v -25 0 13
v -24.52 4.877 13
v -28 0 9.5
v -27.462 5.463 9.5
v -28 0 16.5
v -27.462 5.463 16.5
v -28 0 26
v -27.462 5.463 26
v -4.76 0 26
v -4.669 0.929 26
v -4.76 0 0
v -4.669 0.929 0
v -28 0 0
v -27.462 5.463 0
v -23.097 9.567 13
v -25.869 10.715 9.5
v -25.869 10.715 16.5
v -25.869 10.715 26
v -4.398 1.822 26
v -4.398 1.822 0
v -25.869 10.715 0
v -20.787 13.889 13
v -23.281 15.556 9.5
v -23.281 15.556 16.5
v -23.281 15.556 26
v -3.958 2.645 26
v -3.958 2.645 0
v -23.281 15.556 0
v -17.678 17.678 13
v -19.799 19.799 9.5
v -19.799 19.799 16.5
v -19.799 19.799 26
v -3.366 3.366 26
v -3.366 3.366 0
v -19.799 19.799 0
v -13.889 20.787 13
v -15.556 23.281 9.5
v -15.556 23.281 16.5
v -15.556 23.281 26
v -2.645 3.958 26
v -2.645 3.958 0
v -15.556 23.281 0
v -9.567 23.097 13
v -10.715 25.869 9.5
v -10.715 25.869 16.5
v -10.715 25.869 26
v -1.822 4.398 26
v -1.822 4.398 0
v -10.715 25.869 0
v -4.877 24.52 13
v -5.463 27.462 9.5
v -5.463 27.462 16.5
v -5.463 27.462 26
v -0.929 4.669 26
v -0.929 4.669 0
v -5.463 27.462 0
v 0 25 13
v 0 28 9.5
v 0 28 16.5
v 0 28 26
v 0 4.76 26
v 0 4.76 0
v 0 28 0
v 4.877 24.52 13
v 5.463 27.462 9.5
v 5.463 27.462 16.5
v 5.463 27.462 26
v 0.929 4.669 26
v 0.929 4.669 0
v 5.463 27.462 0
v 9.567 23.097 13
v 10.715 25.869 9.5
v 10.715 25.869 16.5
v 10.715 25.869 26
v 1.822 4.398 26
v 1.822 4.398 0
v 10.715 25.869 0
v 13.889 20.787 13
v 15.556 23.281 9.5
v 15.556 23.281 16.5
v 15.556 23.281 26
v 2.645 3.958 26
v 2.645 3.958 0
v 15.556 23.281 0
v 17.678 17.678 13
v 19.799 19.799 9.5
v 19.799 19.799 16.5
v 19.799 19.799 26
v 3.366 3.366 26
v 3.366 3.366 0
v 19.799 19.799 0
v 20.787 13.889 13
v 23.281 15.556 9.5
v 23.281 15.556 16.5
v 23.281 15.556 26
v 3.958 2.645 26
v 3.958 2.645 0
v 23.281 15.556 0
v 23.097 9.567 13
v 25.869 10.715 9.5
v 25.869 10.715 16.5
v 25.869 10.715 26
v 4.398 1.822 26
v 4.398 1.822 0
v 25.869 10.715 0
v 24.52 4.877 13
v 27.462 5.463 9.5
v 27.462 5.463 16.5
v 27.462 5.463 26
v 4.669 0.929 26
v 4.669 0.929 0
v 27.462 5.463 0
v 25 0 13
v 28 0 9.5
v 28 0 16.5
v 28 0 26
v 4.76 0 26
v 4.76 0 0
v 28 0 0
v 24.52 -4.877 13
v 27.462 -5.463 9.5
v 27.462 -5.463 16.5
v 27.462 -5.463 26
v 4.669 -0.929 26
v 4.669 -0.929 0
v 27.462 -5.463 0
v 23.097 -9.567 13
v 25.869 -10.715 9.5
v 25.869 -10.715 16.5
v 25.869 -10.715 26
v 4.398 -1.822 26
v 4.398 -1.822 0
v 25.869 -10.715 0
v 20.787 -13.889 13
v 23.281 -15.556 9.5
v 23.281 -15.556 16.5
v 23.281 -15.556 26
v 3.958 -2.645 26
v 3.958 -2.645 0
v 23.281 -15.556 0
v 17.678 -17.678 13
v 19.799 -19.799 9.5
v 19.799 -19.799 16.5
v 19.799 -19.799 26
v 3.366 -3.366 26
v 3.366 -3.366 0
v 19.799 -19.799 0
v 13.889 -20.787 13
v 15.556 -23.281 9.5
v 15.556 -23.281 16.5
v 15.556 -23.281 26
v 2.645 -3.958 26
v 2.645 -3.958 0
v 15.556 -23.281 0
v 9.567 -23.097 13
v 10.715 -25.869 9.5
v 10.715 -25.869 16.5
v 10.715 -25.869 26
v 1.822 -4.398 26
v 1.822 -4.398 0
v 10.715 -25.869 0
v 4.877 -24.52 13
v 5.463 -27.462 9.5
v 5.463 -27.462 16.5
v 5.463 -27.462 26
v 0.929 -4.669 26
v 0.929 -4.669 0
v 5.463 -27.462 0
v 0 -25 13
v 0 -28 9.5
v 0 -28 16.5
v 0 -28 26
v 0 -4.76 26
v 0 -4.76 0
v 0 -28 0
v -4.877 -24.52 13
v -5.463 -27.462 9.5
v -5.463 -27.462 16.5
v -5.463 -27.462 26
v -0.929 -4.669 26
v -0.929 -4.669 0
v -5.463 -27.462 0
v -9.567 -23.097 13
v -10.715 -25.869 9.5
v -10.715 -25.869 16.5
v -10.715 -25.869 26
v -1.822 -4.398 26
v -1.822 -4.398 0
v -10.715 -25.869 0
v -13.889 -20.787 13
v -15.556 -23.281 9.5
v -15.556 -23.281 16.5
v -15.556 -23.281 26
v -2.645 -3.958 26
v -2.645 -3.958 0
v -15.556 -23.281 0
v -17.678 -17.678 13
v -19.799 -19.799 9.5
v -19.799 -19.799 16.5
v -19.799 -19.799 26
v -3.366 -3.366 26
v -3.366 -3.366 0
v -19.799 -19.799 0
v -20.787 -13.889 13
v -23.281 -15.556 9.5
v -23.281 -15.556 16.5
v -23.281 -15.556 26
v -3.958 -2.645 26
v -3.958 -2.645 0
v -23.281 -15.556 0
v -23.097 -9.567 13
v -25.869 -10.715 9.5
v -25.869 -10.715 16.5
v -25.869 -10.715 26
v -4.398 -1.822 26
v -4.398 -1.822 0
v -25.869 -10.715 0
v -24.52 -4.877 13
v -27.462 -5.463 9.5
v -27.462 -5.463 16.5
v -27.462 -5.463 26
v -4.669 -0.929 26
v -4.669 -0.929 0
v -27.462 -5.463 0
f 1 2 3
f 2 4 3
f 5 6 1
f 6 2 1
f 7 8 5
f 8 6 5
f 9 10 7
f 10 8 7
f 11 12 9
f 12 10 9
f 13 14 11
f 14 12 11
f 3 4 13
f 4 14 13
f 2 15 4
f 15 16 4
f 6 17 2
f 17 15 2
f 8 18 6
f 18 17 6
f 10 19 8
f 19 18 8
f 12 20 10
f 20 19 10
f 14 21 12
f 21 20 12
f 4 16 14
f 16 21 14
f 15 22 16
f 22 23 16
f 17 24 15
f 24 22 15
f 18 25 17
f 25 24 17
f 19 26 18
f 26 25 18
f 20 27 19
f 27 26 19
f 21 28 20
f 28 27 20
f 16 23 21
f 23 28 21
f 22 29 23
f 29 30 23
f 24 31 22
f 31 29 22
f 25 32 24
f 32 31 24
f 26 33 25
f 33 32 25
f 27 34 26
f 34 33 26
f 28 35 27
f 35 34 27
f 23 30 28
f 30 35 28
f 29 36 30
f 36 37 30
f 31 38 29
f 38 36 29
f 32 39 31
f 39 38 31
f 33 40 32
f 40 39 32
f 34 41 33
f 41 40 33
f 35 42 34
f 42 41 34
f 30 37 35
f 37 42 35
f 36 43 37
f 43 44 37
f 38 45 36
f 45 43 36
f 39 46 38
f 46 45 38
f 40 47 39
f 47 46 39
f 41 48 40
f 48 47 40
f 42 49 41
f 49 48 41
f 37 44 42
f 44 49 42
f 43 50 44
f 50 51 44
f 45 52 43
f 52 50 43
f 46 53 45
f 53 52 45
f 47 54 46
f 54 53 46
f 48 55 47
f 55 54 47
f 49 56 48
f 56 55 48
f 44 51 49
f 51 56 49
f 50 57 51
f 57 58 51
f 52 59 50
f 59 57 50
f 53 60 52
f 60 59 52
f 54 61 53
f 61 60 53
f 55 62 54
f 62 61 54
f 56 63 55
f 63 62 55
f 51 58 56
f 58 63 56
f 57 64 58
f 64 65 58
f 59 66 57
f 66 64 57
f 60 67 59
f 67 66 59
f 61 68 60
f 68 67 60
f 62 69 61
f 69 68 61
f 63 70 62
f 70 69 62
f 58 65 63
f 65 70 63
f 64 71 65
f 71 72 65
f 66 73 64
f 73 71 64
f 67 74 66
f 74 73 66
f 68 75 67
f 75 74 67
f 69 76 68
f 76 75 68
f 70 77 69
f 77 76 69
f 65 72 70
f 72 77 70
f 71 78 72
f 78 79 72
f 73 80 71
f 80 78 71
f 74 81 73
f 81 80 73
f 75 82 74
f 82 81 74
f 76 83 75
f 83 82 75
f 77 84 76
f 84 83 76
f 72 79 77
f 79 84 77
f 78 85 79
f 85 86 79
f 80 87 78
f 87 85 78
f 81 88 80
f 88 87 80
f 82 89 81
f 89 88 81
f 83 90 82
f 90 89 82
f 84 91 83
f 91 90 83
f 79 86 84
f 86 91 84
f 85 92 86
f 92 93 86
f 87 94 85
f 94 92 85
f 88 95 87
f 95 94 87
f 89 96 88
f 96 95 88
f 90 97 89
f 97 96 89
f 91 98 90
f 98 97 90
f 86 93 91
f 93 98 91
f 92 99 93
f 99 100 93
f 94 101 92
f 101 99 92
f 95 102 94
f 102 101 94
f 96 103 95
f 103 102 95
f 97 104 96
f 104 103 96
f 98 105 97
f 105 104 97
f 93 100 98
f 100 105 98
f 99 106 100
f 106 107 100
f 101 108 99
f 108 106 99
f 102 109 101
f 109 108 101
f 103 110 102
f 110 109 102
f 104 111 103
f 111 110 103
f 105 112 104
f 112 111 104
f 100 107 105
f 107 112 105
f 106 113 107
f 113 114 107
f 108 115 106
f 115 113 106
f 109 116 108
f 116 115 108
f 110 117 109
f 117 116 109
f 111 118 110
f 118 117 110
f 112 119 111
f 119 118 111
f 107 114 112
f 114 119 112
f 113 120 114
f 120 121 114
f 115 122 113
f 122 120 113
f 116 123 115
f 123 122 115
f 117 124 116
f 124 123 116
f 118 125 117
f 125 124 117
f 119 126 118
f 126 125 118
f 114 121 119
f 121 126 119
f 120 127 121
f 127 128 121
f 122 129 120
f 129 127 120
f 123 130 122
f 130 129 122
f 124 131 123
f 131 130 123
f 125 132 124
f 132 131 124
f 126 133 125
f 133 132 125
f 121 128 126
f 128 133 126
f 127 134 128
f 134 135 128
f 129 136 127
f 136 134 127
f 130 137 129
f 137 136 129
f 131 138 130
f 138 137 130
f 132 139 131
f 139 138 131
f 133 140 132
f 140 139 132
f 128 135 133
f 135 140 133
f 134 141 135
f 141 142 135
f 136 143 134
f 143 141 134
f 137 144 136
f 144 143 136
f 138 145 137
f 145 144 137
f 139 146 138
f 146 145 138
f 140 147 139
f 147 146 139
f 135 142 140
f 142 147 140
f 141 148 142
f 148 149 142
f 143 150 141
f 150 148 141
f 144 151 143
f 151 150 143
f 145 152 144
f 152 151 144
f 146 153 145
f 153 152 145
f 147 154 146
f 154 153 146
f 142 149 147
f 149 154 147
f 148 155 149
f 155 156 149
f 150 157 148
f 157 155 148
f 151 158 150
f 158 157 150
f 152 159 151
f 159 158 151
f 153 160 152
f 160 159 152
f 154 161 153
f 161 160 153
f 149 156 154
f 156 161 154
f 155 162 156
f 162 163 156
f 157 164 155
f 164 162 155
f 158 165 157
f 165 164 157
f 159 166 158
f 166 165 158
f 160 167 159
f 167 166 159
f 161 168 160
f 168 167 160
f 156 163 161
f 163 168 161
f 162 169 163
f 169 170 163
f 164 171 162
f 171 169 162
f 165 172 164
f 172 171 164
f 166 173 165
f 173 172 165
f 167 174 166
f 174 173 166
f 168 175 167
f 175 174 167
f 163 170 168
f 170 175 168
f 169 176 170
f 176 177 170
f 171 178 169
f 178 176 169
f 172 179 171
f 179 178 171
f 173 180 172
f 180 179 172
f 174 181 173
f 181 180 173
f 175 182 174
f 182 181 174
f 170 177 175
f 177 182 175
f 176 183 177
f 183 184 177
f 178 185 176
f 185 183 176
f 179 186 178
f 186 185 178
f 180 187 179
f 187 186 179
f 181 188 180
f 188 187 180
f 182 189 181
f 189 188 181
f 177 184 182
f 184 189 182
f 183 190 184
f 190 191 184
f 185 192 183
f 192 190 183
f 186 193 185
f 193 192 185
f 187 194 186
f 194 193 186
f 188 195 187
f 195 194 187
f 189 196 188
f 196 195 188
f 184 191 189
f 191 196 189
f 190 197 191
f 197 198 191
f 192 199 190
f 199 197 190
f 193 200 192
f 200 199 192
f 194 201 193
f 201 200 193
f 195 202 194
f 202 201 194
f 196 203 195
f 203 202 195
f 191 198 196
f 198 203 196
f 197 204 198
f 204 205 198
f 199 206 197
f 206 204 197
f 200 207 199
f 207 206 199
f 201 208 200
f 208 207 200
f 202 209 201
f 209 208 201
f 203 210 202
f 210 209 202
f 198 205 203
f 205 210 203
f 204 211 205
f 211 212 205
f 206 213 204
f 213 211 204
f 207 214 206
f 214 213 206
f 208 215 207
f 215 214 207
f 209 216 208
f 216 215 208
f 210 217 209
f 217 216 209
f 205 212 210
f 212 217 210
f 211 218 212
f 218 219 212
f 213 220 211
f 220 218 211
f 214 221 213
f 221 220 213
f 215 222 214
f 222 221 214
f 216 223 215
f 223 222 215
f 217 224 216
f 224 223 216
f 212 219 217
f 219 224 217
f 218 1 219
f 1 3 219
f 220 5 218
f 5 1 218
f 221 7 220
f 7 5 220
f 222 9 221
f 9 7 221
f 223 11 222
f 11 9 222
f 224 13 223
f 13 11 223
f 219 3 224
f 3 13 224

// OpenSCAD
$fn = 32;

// ----------------------------------------------------------------------
// Belt roller: 56 mm barrel, 26 mm wide, bore 9.52 mm
// ----------------------------------------------------------------------

// --- parameters (mm) ---
bore_d = 9.52;            // bore
barrel_d = 56;            // barrel diameter
roller_w = 26;            // roller width
groove_w = 7;             // guide groove width
groove_d = 3;             // guide groove depth

roller_profile = [[4.76, 0], [28, 0], [28, 9.5], [25, 13], [28, 16.5], [28, 26], [4.76, 26]];

/* the profile stays clear of the axis, so the bore comes out of the revolve */
rotate_extrude() polygon(roller_profile);
